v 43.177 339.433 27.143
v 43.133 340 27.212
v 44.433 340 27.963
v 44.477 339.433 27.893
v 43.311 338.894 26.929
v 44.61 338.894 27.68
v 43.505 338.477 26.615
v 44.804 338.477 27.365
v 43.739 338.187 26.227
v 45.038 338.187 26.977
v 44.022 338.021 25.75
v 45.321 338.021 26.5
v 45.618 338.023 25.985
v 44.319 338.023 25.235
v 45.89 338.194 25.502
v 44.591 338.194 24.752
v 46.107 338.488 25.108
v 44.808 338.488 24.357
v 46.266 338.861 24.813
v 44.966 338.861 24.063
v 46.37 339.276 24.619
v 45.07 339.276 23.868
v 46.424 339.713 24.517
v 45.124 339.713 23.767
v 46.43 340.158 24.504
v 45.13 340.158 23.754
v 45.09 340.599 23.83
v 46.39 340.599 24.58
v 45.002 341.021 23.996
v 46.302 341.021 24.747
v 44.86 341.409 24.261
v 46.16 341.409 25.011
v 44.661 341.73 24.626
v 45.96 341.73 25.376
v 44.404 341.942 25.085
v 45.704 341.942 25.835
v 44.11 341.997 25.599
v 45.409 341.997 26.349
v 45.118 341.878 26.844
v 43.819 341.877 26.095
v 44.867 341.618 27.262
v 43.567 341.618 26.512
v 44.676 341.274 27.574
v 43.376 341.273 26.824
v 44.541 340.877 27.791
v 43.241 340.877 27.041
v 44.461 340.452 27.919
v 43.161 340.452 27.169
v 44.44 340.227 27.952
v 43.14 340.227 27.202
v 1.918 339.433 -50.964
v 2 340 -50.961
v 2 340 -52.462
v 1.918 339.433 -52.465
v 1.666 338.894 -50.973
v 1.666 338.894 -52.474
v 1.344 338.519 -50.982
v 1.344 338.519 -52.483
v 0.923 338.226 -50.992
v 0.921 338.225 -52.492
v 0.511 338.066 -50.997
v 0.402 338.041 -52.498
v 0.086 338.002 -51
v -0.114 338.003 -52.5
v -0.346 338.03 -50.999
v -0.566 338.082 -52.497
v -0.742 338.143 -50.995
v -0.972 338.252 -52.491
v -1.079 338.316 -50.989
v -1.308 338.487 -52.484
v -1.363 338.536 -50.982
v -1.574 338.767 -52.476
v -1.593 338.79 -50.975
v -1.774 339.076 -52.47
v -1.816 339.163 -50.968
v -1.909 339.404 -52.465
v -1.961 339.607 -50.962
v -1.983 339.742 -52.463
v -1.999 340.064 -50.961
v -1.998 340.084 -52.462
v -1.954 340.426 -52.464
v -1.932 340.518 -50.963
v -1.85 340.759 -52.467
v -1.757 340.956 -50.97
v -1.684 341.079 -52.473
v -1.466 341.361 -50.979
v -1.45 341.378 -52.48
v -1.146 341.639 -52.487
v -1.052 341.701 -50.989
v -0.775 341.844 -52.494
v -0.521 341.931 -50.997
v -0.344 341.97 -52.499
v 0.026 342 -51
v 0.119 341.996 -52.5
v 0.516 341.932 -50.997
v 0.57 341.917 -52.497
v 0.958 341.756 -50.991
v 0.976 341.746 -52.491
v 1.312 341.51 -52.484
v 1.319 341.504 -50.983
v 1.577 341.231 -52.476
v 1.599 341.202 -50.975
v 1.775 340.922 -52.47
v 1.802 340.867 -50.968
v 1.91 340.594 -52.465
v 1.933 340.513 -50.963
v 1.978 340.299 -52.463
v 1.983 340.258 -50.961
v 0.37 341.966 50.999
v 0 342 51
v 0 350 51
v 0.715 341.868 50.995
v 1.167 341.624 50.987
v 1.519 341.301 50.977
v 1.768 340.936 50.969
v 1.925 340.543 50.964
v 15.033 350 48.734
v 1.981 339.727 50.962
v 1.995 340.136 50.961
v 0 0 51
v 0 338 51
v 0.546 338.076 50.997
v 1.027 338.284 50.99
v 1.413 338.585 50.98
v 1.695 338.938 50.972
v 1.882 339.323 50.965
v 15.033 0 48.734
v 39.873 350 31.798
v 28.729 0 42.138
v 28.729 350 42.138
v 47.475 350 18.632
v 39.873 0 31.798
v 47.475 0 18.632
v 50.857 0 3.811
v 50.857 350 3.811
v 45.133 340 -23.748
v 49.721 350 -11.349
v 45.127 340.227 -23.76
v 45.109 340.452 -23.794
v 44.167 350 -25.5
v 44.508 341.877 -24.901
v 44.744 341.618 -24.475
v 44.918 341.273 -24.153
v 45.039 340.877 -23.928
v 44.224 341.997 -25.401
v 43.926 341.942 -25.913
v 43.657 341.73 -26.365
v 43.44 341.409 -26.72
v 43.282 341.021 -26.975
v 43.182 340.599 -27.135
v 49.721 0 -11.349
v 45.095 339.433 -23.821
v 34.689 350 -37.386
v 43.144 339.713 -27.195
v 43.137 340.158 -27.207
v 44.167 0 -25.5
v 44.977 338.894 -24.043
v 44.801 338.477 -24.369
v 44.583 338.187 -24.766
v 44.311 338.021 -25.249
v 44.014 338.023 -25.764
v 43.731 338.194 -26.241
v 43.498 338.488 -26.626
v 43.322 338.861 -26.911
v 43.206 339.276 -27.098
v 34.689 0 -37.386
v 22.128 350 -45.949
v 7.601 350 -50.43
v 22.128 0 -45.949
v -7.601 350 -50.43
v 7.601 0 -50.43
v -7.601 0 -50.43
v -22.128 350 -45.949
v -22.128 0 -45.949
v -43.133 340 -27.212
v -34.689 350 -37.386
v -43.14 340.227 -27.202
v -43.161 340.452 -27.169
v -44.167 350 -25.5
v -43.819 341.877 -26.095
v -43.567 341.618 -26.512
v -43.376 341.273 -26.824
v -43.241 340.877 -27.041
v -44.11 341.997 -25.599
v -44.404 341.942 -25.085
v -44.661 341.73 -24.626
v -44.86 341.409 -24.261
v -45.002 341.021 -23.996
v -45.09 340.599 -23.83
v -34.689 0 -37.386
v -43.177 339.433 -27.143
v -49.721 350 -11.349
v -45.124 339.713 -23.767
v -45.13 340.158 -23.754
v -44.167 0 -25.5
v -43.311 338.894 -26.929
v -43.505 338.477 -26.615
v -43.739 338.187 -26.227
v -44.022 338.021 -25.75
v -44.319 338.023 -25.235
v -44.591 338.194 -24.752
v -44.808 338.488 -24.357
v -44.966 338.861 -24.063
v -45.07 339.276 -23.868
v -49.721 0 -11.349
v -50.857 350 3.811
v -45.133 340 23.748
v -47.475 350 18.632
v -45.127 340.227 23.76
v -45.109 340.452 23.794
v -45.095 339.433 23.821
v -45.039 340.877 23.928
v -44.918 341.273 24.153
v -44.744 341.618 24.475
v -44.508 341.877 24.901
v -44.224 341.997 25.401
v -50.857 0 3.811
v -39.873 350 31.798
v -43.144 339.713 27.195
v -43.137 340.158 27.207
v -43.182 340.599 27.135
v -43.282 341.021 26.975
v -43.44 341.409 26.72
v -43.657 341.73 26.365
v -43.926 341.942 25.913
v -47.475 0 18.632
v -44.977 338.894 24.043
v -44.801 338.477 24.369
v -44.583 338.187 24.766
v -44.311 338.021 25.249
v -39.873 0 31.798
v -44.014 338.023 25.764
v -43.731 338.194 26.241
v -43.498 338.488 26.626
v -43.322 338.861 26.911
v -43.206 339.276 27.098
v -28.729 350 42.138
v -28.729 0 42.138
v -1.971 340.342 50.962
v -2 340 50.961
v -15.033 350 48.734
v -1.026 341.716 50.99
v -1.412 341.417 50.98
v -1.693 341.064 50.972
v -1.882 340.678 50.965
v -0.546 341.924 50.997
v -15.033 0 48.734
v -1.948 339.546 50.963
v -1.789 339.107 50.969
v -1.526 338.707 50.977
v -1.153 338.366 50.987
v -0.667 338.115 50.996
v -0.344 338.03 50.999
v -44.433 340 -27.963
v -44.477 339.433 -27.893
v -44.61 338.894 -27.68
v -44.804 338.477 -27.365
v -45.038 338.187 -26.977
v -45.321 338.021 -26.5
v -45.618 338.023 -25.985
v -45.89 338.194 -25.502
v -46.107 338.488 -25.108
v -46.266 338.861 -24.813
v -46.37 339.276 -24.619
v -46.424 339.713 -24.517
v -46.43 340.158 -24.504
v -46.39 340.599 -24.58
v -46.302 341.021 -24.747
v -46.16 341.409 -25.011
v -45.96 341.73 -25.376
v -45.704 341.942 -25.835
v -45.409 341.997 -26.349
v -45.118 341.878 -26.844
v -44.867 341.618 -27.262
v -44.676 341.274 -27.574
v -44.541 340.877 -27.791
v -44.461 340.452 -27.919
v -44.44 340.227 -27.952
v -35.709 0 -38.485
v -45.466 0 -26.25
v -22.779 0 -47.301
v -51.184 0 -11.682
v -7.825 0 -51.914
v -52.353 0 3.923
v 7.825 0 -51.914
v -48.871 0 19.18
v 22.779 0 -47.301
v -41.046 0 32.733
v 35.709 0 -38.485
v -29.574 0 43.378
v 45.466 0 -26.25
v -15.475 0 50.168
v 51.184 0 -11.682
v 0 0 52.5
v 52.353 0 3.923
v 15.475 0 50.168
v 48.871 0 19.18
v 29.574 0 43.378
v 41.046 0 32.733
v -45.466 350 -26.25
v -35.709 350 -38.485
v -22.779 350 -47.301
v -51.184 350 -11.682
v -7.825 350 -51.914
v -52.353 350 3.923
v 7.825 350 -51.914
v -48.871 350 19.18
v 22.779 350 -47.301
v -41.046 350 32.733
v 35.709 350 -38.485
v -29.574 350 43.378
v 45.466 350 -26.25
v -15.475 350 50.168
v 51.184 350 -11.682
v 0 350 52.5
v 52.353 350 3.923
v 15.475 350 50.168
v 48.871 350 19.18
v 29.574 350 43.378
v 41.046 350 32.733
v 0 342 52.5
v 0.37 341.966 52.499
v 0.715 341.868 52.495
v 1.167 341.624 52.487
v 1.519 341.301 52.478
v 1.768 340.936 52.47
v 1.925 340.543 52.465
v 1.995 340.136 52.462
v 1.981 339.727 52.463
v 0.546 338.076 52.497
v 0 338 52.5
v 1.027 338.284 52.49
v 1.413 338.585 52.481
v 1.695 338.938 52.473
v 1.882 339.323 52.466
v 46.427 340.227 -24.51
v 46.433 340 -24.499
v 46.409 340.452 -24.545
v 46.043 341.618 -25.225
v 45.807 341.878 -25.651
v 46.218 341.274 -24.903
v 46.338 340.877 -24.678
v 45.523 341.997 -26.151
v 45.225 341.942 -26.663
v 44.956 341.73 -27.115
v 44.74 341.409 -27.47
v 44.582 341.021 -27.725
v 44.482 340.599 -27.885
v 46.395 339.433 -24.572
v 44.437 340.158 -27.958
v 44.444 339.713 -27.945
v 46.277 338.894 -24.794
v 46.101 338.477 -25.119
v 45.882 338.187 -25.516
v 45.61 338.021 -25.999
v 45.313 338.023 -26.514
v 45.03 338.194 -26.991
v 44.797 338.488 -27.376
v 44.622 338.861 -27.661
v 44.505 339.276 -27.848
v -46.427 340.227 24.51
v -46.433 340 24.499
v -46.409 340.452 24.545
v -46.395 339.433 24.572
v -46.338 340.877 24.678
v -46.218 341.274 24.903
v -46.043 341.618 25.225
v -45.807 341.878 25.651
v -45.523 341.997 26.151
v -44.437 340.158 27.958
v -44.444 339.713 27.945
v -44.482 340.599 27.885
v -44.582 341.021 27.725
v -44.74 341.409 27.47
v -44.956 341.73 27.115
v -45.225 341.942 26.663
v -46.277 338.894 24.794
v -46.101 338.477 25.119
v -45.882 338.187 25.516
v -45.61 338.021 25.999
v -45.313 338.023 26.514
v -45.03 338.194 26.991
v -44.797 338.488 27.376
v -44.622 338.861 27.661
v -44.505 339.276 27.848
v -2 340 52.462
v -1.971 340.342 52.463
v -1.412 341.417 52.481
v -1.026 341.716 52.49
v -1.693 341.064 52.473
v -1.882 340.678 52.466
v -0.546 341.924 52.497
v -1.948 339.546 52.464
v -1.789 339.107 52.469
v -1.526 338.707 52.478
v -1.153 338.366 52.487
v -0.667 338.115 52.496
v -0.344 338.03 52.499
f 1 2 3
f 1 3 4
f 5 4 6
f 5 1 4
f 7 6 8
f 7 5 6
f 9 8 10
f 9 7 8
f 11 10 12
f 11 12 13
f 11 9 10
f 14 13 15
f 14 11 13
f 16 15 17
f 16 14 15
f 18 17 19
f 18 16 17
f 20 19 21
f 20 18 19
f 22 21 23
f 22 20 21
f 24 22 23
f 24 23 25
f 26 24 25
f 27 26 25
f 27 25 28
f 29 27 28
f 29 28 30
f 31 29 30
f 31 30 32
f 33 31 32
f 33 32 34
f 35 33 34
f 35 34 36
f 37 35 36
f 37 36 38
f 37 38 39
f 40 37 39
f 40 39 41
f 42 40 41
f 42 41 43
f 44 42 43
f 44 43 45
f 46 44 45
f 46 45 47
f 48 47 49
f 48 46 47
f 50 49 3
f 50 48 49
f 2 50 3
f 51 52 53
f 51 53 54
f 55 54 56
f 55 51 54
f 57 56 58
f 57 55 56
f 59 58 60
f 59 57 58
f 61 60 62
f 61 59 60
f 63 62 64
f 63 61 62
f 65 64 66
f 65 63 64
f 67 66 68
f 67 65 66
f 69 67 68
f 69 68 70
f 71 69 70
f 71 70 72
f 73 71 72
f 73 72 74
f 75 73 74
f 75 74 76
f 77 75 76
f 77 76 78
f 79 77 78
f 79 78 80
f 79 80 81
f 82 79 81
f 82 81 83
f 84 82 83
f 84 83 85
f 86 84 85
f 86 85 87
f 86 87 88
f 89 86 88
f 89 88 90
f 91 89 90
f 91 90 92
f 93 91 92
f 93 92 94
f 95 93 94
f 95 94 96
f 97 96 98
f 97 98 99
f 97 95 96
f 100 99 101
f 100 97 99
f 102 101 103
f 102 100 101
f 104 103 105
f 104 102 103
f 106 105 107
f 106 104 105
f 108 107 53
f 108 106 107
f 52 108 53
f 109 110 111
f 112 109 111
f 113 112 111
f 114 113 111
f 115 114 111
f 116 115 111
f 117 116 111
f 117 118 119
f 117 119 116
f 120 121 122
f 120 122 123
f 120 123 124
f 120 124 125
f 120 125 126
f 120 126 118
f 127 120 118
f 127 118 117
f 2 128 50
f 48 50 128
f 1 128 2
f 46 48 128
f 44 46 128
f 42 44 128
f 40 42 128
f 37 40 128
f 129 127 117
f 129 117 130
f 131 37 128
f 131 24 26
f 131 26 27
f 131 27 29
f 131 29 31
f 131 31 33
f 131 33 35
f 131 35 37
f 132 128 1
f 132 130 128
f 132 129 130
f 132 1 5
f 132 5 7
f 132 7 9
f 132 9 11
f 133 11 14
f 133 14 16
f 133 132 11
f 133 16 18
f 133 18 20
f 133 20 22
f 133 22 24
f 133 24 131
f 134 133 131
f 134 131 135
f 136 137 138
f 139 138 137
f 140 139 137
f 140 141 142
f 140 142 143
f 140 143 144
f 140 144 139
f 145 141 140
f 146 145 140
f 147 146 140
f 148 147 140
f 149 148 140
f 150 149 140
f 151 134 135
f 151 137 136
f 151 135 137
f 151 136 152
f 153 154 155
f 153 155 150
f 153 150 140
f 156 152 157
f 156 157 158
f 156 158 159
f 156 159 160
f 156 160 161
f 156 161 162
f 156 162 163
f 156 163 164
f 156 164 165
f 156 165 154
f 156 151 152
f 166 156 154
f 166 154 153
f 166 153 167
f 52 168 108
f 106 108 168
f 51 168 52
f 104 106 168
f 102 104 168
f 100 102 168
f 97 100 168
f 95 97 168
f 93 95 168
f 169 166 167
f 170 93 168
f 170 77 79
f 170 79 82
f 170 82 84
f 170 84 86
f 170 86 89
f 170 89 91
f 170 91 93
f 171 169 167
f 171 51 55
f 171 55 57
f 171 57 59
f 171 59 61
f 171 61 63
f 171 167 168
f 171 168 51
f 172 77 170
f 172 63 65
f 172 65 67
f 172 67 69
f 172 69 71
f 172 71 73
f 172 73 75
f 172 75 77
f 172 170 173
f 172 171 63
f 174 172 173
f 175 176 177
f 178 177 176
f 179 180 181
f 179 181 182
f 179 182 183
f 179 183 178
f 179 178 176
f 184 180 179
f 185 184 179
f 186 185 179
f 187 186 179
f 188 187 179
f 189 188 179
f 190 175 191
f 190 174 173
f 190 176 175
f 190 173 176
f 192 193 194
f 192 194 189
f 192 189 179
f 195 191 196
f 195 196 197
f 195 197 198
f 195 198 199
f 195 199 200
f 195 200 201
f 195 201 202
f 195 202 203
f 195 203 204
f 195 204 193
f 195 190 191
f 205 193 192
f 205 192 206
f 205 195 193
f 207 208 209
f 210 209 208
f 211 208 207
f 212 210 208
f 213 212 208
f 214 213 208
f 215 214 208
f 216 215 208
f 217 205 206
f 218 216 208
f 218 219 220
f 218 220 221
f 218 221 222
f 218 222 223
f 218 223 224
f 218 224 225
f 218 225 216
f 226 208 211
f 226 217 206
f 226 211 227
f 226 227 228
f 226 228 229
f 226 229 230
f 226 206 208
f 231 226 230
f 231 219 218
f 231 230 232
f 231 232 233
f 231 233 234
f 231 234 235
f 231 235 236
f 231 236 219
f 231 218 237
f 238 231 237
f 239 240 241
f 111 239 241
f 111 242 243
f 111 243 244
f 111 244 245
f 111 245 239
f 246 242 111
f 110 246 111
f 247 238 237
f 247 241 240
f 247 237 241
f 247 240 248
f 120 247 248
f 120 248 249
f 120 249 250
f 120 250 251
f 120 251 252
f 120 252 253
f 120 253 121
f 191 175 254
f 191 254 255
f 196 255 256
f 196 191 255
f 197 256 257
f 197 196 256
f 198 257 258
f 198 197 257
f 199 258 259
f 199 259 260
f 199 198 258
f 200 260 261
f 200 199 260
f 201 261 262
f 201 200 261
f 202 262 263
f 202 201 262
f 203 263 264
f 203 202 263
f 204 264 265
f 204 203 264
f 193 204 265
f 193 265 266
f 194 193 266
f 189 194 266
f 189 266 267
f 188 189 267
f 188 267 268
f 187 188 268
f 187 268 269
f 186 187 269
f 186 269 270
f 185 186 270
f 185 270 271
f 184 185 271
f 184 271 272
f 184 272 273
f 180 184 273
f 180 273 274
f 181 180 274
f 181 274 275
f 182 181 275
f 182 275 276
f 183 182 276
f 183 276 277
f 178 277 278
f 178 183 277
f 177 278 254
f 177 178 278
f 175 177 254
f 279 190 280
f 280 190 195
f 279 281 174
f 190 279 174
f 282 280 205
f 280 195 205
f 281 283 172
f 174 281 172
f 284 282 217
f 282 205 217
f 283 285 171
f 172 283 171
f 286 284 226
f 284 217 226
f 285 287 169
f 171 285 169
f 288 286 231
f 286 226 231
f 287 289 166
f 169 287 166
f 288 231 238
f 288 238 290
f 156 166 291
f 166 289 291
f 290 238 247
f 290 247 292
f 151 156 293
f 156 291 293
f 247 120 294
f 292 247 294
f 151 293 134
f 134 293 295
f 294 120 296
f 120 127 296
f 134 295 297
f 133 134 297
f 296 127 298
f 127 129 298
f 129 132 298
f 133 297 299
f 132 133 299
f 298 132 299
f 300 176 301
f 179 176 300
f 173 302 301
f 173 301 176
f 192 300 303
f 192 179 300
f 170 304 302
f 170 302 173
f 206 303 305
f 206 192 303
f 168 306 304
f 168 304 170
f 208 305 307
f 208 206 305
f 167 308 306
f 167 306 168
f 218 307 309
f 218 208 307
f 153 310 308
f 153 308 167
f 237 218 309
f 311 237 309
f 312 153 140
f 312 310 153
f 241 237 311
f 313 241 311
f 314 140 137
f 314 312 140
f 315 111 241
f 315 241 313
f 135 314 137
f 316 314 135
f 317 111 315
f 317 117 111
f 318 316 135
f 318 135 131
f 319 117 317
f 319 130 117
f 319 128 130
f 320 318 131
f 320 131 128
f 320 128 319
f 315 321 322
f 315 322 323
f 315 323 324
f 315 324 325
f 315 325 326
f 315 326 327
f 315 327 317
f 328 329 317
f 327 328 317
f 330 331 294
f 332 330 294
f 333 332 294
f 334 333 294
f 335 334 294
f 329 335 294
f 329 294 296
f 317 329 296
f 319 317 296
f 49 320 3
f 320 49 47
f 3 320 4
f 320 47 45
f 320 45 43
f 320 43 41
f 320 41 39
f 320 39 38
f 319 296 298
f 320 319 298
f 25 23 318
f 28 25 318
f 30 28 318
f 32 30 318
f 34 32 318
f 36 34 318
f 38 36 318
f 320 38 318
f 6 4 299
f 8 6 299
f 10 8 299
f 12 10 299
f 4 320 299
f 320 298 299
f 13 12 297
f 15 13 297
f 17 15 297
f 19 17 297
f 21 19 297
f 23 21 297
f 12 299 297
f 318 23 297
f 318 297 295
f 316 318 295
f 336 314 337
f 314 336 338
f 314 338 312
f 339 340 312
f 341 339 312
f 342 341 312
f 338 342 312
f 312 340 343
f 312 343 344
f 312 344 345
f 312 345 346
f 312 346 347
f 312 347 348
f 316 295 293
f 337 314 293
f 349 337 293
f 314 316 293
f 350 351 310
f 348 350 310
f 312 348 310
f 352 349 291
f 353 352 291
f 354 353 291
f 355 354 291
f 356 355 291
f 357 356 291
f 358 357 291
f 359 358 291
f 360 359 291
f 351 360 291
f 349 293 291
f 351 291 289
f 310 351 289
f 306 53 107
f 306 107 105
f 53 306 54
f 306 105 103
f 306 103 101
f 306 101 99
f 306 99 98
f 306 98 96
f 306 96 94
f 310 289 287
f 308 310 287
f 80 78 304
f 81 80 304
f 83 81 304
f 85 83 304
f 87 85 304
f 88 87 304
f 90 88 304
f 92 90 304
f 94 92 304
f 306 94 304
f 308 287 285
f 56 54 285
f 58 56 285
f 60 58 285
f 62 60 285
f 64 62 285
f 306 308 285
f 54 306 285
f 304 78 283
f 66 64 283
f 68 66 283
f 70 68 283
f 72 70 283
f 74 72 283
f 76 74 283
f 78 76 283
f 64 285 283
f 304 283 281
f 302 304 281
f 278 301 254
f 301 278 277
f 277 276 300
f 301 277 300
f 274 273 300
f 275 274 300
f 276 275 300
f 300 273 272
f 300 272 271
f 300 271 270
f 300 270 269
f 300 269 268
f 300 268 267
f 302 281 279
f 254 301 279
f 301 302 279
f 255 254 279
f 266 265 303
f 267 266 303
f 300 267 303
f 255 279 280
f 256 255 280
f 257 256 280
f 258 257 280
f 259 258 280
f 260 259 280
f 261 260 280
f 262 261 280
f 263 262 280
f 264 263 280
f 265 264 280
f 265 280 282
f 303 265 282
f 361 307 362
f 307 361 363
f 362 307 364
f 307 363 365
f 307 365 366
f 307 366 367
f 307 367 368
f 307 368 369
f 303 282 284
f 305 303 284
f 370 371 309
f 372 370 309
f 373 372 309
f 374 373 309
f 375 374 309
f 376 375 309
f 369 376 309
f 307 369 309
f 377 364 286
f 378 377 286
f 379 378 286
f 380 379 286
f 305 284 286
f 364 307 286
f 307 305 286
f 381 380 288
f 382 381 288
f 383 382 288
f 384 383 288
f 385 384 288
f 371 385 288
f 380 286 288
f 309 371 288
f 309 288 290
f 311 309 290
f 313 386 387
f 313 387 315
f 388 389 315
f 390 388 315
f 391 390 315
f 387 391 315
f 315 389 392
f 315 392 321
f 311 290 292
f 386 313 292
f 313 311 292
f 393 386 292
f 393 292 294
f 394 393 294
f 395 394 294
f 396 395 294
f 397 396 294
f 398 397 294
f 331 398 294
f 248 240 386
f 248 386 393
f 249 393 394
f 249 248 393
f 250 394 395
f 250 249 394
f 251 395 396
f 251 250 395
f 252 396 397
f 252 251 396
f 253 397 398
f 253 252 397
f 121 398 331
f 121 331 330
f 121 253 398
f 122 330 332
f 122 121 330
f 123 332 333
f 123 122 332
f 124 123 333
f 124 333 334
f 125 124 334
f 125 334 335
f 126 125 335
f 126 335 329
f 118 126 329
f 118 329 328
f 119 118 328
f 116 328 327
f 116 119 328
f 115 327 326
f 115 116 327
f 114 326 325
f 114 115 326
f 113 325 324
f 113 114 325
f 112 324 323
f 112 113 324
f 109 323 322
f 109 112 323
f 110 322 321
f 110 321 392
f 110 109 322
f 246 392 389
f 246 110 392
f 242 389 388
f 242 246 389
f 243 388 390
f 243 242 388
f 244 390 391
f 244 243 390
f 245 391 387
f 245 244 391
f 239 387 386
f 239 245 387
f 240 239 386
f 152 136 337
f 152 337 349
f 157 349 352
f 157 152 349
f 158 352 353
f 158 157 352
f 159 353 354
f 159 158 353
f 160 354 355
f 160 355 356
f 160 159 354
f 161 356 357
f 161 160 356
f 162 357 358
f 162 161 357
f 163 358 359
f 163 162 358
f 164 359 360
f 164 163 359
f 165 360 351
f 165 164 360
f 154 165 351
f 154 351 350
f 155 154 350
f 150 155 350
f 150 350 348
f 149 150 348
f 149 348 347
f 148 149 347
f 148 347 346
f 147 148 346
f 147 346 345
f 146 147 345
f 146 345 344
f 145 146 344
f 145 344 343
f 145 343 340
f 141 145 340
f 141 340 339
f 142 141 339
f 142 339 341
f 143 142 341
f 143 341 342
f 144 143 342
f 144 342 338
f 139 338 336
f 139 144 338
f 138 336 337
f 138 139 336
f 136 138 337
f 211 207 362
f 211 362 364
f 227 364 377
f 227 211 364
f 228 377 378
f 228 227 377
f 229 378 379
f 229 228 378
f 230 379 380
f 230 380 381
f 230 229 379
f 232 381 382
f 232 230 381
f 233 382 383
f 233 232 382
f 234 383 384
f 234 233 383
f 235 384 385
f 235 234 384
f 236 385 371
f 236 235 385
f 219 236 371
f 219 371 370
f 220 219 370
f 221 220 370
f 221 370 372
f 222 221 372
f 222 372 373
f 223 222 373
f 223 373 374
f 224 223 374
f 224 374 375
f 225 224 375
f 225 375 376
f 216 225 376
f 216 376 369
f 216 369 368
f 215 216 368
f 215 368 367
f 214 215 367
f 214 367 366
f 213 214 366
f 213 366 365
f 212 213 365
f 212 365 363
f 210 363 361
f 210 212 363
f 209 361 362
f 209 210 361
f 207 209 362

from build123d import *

# Parameters (mm, degrees)
SKETCH_1_R               = 52.5
SKETCH_1_R_2             = 51
EXTRUDE_1_DEPTH          = 350
SKETCH_2_R               = 2
CUT_EXTRUDE_1_DEPTH      = 64
PATTERN_CIRCULAR_1_COUNT = 6


with BuildPart() as part:
    # Эскиз1 → Бобышка-Вытянуть1 (new body)
    with BuildSketch(Plane(origin=(0, 0, 0), x_dir=(1, 0, 0), z_dir=(0, 1, 0))):
        with Locations(Location((0, 0, 0), (0, 0, 270))):
            Circle(SKETCH_1_R)
        with Locations(Location((0, 0, 0), (0, 0, 270))):
            Circle(SKETCH_1_R_2, mode=Mode.SUBTRACT)
    extrude(amount=EXTRUDE_1_DEPTH)

    # Эскиз2 → Вырез-Вытянуть1 (cut)
    with BuildSketch(Plane.XY):
        with Locations(Location((0, 340, 0), (0, 0, 180))):
            Circle(SKETCH_2_R)
    cut_extrude_1 = extrude(amount=CUT_EXTRUDE_1_DEPTH, mode=Mode.SUBTRACT)

    # Круговой массив1: Вырез-Вытянуть1 ×6 about axis
    pattern_circular_1_axis = Axis((0, 350, 0), (0, -1, 0))
    for i in range(1, PATTERN_CIRCULAR_1_COUNT):
        add(cut_extrude_1.rotate(pattern_circular_1_axis, i * 360 / PATTERN_CIRCULAR_1_COUNT), mode=Mode.SUBTRACT)


solid = part.part
